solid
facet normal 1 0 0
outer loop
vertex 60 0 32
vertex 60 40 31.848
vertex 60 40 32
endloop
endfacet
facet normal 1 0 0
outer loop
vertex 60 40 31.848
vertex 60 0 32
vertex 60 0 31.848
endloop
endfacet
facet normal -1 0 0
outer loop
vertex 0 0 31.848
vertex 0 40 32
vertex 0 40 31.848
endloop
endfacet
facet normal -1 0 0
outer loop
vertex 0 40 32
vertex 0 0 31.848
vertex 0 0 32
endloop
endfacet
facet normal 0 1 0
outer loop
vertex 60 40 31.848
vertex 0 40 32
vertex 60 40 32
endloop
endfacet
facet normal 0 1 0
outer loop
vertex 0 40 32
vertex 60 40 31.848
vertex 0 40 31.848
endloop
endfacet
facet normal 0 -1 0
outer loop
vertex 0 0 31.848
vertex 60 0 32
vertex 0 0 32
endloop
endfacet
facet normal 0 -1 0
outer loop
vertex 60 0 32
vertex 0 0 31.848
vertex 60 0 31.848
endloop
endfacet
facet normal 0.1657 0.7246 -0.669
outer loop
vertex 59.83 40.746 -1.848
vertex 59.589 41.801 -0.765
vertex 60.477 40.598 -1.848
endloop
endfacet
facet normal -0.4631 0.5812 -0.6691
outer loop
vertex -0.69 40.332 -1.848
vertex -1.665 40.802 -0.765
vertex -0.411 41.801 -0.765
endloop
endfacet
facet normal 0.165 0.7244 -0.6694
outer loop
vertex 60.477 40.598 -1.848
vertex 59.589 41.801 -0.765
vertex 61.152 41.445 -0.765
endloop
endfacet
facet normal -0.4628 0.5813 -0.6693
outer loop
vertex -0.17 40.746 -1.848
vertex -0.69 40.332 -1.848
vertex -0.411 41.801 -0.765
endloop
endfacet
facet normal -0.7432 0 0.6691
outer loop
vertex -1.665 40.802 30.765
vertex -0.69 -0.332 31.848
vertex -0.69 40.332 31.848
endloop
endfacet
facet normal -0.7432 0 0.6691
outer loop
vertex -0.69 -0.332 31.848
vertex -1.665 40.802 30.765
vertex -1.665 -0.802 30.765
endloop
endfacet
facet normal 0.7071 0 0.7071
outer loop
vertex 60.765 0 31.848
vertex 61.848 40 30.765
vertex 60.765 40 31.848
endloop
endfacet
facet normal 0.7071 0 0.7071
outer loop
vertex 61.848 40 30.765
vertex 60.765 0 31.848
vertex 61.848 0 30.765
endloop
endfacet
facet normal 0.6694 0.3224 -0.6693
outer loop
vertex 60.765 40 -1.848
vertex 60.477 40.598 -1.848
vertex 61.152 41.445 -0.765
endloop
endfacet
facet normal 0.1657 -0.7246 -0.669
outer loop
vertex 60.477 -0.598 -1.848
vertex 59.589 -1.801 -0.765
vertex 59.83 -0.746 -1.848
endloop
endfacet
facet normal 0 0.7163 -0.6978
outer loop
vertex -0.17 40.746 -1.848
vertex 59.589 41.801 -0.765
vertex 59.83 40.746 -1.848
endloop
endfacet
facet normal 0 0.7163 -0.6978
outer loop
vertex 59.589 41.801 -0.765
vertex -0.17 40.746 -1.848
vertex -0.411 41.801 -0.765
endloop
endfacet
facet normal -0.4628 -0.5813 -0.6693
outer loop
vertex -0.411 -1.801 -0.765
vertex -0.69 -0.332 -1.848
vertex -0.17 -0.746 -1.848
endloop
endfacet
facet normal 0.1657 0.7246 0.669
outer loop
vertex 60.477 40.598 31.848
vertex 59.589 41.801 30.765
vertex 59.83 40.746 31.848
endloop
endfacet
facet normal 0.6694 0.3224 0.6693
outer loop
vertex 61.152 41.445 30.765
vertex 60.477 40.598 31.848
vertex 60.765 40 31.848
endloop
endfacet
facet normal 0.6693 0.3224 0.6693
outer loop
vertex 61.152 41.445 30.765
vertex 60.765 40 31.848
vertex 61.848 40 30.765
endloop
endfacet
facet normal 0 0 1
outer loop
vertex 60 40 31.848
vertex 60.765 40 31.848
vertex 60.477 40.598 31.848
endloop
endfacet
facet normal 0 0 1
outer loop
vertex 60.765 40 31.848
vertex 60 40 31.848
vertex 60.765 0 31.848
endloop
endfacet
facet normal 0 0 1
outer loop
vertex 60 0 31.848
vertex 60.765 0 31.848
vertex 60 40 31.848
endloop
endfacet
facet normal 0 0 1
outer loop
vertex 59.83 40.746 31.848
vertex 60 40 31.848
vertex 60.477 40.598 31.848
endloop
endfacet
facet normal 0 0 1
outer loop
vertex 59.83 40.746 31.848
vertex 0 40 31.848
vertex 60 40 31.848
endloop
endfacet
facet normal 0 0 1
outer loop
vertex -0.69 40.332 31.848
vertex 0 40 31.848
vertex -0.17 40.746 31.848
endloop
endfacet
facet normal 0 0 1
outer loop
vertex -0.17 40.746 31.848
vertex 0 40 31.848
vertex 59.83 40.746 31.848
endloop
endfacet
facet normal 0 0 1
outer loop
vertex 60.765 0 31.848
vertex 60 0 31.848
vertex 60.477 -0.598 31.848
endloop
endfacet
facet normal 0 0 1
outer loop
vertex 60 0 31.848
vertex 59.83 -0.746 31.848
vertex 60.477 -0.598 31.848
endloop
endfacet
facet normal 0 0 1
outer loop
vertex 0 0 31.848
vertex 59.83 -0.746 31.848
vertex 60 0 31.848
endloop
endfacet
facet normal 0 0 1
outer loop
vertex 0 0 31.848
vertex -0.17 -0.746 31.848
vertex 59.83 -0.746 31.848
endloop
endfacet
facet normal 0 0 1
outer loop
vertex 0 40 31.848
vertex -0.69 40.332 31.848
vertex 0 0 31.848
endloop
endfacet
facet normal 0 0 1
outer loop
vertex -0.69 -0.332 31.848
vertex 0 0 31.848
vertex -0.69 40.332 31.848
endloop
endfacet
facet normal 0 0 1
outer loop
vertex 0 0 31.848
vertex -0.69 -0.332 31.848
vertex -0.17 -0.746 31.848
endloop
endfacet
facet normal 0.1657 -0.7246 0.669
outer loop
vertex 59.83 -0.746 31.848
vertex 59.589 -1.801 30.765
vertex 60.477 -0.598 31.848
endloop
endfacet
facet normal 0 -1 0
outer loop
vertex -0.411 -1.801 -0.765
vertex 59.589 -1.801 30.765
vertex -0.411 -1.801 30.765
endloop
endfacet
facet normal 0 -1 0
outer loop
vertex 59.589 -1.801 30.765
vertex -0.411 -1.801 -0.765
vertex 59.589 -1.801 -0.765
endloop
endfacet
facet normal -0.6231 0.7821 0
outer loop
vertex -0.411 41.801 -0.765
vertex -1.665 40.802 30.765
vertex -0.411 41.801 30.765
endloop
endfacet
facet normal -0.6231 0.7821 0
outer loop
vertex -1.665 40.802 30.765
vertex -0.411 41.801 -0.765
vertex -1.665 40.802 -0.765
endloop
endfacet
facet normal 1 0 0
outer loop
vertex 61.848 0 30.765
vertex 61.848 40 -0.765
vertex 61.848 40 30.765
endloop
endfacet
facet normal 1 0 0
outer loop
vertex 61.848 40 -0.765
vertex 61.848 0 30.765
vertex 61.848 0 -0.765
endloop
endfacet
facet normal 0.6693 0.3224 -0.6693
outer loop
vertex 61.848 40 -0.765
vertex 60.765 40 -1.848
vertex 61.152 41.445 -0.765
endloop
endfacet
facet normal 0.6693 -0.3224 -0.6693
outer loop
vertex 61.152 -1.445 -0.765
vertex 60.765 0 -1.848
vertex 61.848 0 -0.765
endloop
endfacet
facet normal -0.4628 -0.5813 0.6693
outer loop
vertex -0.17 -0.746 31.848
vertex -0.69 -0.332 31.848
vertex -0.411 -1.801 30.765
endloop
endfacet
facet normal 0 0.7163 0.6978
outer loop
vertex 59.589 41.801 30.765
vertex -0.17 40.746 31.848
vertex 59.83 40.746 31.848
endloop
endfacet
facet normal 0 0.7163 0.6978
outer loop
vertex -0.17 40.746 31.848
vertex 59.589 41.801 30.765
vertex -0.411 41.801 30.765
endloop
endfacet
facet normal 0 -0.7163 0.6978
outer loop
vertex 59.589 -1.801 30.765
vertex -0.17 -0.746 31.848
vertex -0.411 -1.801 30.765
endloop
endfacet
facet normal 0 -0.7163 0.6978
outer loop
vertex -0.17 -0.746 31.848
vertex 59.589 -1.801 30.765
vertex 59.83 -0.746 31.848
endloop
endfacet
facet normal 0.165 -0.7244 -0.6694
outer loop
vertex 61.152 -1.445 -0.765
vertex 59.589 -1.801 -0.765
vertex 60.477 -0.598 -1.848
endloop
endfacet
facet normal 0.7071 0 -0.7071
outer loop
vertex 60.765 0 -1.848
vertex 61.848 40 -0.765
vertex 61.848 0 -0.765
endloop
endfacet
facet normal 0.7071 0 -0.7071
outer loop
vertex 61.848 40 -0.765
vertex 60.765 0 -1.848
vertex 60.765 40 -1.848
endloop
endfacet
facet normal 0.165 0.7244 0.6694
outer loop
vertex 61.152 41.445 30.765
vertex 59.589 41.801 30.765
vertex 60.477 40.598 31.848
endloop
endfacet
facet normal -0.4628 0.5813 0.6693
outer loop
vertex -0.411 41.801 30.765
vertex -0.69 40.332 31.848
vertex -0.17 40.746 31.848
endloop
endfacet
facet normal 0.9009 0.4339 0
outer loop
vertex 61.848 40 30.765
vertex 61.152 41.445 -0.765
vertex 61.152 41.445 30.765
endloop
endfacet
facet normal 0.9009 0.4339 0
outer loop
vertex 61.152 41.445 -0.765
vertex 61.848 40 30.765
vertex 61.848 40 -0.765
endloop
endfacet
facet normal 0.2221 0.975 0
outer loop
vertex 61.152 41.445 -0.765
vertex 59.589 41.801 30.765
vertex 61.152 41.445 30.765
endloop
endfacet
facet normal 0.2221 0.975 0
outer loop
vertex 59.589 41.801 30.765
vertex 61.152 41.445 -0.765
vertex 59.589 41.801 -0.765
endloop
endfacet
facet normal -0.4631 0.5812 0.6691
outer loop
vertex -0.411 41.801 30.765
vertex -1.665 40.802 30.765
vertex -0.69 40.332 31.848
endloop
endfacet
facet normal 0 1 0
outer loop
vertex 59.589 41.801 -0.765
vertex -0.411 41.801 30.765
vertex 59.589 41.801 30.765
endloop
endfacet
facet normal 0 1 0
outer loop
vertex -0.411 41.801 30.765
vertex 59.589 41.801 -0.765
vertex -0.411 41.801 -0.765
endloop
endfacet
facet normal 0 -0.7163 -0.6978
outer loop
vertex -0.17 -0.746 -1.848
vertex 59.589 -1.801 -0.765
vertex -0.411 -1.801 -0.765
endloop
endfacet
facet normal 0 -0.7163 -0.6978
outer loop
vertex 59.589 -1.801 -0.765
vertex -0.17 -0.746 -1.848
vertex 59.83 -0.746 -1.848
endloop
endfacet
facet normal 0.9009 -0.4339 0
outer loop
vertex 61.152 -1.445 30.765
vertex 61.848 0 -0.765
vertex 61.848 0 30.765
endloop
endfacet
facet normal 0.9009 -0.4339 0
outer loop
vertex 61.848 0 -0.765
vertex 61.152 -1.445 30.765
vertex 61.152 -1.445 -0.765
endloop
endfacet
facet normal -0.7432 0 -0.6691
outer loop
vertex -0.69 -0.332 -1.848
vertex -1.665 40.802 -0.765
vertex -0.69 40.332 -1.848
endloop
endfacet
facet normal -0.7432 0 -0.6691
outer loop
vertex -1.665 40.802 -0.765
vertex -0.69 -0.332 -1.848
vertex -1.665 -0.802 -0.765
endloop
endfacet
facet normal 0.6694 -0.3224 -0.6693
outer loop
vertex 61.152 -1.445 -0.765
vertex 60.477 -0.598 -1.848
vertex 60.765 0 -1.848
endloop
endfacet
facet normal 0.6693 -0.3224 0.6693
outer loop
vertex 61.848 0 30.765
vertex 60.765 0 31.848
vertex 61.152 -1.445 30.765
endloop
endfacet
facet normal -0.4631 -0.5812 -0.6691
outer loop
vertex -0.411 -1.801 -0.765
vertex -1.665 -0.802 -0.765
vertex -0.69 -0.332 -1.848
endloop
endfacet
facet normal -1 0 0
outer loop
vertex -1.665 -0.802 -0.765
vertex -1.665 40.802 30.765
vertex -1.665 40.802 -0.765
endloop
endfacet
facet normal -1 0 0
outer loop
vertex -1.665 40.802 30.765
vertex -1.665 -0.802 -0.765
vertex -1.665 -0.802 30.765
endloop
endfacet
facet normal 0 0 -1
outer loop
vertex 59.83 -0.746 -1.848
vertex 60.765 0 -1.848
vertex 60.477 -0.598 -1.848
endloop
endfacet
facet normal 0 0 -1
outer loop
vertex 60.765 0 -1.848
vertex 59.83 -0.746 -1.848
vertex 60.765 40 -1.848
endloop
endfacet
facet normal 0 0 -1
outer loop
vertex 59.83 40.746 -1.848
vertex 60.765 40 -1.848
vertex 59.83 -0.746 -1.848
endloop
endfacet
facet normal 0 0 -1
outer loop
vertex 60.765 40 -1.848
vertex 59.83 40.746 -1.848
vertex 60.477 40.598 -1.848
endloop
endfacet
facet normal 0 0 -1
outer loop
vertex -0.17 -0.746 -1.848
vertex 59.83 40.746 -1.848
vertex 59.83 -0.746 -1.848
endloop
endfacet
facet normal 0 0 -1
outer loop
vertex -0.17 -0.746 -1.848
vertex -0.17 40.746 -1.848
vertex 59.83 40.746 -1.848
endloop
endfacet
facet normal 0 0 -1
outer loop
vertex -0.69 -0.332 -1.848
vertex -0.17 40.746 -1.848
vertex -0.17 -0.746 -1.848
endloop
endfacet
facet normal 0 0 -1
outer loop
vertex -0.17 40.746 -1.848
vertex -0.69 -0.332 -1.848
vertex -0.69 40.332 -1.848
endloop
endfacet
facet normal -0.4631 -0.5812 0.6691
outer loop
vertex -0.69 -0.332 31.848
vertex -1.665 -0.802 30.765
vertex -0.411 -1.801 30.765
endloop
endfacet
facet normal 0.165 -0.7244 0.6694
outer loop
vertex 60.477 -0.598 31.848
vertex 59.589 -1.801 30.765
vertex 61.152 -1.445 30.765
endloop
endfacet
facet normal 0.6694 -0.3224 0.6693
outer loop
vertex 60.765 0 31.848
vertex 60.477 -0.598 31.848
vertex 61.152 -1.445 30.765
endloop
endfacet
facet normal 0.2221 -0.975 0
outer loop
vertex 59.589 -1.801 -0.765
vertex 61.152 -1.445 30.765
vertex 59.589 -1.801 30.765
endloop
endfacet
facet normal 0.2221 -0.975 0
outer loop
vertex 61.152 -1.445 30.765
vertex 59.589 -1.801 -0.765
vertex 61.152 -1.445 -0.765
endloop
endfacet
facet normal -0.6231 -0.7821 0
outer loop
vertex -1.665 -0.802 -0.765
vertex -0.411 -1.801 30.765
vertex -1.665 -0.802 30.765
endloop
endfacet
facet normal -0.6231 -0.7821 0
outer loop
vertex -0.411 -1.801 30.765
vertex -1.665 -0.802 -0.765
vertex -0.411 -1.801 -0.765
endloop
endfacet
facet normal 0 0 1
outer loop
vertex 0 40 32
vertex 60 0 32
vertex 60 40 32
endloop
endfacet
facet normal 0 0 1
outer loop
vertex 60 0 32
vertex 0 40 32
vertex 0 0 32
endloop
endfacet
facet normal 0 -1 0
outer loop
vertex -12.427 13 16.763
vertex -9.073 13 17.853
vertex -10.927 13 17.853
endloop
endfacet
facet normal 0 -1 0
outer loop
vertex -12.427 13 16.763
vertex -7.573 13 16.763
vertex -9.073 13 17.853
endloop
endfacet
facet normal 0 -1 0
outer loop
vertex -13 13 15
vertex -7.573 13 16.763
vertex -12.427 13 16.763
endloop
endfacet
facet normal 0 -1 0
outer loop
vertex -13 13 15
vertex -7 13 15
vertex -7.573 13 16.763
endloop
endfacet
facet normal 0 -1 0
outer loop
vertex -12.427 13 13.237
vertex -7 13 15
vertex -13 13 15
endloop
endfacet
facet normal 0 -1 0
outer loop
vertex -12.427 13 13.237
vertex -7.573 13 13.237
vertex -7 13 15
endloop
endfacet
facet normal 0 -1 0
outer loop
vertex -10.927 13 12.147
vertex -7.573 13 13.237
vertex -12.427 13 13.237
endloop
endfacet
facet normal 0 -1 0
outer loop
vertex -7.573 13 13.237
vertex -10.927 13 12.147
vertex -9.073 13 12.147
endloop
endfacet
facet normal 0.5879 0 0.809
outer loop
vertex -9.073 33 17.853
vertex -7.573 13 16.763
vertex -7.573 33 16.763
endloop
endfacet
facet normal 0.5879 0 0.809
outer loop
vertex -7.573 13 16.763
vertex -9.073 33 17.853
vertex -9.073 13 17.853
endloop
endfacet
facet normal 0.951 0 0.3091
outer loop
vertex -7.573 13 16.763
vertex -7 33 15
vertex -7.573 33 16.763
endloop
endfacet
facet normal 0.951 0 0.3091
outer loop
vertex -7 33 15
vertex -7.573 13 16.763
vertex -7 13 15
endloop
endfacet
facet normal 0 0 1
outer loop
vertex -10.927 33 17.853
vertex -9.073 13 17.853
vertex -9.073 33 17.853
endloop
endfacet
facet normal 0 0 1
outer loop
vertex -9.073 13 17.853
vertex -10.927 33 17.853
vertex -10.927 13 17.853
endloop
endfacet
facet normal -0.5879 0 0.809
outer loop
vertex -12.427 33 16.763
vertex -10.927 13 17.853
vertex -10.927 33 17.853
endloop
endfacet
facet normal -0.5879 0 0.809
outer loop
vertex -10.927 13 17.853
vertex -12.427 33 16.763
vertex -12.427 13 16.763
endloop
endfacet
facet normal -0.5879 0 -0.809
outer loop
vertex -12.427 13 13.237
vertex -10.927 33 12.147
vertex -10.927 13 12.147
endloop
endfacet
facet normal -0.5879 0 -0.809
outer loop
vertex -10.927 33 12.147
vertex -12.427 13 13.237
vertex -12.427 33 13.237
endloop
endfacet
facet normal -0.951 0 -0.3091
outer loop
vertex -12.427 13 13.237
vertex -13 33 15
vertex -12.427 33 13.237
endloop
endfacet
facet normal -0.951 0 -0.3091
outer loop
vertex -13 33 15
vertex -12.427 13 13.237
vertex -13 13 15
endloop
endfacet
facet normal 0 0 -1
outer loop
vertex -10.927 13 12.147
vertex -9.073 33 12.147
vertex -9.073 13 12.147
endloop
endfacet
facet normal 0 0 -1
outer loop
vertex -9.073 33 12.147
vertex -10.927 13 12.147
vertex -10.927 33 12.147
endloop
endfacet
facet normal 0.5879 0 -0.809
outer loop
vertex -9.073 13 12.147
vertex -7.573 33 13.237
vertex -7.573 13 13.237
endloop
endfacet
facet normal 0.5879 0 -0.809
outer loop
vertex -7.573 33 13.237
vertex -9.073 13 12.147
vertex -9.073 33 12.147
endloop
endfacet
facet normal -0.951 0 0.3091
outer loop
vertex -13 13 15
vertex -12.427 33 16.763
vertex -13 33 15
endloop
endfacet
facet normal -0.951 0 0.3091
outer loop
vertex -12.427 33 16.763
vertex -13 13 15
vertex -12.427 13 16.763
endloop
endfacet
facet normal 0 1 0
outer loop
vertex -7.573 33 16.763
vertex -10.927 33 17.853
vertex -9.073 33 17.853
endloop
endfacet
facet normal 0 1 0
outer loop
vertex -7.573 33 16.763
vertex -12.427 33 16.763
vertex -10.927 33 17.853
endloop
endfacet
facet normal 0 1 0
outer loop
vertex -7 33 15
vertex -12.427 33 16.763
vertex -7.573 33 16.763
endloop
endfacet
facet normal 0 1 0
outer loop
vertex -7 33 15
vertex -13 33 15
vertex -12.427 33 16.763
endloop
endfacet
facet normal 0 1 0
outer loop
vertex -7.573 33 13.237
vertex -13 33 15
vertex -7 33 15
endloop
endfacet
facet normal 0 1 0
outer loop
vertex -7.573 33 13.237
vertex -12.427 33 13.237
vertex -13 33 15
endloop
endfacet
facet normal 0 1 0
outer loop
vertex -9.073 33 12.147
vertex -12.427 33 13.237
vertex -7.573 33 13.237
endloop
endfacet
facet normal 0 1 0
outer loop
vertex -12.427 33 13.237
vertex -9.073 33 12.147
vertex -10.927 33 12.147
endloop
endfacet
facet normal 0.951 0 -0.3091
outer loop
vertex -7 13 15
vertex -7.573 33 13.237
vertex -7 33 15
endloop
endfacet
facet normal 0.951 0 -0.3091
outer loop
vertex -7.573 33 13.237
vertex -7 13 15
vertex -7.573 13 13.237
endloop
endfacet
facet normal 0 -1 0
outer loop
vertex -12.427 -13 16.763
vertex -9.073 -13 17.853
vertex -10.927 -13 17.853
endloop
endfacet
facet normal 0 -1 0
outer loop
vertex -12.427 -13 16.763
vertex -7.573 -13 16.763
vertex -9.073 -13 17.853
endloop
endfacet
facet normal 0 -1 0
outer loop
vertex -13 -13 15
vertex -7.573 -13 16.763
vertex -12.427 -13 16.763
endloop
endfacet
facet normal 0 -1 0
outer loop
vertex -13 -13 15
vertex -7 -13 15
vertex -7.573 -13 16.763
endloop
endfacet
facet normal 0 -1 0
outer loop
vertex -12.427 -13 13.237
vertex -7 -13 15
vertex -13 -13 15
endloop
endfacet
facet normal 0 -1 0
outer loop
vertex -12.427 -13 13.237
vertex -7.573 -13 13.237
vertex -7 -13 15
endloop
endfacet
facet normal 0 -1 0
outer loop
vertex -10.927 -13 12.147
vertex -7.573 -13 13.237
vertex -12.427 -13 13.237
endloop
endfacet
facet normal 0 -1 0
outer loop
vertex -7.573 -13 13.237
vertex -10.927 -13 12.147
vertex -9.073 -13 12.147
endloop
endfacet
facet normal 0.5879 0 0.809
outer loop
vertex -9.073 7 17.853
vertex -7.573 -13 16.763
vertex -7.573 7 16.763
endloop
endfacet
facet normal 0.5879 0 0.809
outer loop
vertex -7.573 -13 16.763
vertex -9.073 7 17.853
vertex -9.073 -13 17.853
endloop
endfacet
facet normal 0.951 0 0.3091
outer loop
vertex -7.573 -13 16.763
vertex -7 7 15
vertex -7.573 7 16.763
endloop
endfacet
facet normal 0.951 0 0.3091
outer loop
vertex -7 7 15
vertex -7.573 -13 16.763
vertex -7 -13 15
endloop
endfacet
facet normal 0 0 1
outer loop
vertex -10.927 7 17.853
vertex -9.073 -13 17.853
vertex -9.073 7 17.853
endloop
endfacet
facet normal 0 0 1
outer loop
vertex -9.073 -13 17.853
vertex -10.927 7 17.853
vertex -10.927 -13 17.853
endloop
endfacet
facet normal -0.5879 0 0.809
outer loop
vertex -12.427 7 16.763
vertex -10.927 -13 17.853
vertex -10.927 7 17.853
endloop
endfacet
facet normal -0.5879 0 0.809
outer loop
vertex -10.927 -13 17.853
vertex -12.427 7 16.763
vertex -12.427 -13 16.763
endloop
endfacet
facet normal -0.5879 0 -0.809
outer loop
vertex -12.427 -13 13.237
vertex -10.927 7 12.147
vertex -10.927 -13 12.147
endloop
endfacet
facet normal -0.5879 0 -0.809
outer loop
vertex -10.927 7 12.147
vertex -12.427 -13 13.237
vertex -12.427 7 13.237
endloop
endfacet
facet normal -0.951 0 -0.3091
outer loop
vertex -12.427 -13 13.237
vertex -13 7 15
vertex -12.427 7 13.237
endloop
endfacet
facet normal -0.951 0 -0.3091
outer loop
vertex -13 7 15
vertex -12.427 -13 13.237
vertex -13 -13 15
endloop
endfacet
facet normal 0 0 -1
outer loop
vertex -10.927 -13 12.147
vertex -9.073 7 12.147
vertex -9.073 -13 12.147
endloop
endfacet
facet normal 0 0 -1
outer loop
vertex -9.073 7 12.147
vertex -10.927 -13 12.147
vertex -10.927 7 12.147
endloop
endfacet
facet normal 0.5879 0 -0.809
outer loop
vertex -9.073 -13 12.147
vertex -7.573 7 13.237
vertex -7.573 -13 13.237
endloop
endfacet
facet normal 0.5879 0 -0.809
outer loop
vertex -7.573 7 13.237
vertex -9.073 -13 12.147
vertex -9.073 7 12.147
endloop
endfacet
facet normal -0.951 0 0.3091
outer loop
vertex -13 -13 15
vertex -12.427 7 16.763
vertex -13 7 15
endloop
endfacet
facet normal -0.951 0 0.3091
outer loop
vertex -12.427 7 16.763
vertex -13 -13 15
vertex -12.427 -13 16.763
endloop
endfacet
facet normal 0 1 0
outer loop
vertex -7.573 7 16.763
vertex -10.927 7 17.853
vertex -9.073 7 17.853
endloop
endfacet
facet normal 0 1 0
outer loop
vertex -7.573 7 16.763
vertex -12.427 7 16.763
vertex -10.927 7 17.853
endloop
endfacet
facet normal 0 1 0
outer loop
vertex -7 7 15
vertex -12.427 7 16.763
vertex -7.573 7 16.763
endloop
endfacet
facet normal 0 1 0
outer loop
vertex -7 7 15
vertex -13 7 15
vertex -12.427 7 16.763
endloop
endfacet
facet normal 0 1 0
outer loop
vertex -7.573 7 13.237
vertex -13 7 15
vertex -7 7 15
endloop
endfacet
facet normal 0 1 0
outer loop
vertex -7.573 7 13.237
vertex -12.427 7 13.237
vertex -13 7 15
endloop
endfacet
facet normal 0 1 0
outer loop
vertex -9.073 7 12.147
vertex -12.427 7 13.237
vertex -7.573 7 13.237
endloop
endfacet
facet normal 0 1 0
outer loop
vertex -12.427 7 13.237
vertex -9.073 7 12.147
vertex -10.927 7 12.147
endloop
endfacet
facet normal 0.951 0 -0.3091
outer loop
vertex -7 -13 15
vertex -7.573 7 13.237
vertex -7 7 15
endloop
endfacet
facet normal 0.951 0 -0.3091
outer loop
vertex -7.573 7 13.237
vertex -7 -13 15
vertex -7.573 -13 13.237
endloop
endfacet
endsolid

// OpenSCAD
// Parameters
box_length = 60;
box_width  = 40;
box_height = 30;
wall_thickness = 2;
// Outer box
difference() {
    cube([box_length, box_width, box_height], center=false);
    translate([wall_thickness, wall_thickness, wall_thickness])
        cube([box_length - 2*wall_thickness,
              box_width - 2*wall_thickness,
              box_height], center=false);
}
// Lid
translate([0,0,box_height])
    cube([box_length, box_width, wall_thickness], center=false);
// Side handles
handle_radius = 3;
handle_length = 20;

translate([-handle_length/2, box_width/2 + handle_radius, box_height/2])
    rotate([90,0,0]) cylinder(r=handle_radius, h=handle_length, center=true);

translate([-handle_length/2, -handle_radius, box_height/2])
    rotate([90,0,0]) cylinder(r=handle_radius, h=handle_length, center=true);
// Rounded box
minkowski() {
    cube([box_length, box_width, box_height]);
    sphere(r=2);  // radius controls roundness
}
// Rounded box with handles
difference() {
    minkowski() {
        cube([box_length, box_width, box_height]);
        sphere(r=2);
    }
    translate([wall_thickness, wall_thickness, wall_thickness])
        cube([box_length - 2*wall_thickness,
              box_width - 2*wall_thickness,
              box_height], center=false);
}

// Add handles
translate([-handle_length/2, box_width/2 + handle_radius, box_height/2])
    rotate([90,0,0]) cylinder(r=handle_radius, h=handle_length, center=true);

translate([-handle_length/2, -handle_radius, box_height/2])
    rotate([90,0,0]) cylinder(r=handle_radius, h=handle_length, center=true);
